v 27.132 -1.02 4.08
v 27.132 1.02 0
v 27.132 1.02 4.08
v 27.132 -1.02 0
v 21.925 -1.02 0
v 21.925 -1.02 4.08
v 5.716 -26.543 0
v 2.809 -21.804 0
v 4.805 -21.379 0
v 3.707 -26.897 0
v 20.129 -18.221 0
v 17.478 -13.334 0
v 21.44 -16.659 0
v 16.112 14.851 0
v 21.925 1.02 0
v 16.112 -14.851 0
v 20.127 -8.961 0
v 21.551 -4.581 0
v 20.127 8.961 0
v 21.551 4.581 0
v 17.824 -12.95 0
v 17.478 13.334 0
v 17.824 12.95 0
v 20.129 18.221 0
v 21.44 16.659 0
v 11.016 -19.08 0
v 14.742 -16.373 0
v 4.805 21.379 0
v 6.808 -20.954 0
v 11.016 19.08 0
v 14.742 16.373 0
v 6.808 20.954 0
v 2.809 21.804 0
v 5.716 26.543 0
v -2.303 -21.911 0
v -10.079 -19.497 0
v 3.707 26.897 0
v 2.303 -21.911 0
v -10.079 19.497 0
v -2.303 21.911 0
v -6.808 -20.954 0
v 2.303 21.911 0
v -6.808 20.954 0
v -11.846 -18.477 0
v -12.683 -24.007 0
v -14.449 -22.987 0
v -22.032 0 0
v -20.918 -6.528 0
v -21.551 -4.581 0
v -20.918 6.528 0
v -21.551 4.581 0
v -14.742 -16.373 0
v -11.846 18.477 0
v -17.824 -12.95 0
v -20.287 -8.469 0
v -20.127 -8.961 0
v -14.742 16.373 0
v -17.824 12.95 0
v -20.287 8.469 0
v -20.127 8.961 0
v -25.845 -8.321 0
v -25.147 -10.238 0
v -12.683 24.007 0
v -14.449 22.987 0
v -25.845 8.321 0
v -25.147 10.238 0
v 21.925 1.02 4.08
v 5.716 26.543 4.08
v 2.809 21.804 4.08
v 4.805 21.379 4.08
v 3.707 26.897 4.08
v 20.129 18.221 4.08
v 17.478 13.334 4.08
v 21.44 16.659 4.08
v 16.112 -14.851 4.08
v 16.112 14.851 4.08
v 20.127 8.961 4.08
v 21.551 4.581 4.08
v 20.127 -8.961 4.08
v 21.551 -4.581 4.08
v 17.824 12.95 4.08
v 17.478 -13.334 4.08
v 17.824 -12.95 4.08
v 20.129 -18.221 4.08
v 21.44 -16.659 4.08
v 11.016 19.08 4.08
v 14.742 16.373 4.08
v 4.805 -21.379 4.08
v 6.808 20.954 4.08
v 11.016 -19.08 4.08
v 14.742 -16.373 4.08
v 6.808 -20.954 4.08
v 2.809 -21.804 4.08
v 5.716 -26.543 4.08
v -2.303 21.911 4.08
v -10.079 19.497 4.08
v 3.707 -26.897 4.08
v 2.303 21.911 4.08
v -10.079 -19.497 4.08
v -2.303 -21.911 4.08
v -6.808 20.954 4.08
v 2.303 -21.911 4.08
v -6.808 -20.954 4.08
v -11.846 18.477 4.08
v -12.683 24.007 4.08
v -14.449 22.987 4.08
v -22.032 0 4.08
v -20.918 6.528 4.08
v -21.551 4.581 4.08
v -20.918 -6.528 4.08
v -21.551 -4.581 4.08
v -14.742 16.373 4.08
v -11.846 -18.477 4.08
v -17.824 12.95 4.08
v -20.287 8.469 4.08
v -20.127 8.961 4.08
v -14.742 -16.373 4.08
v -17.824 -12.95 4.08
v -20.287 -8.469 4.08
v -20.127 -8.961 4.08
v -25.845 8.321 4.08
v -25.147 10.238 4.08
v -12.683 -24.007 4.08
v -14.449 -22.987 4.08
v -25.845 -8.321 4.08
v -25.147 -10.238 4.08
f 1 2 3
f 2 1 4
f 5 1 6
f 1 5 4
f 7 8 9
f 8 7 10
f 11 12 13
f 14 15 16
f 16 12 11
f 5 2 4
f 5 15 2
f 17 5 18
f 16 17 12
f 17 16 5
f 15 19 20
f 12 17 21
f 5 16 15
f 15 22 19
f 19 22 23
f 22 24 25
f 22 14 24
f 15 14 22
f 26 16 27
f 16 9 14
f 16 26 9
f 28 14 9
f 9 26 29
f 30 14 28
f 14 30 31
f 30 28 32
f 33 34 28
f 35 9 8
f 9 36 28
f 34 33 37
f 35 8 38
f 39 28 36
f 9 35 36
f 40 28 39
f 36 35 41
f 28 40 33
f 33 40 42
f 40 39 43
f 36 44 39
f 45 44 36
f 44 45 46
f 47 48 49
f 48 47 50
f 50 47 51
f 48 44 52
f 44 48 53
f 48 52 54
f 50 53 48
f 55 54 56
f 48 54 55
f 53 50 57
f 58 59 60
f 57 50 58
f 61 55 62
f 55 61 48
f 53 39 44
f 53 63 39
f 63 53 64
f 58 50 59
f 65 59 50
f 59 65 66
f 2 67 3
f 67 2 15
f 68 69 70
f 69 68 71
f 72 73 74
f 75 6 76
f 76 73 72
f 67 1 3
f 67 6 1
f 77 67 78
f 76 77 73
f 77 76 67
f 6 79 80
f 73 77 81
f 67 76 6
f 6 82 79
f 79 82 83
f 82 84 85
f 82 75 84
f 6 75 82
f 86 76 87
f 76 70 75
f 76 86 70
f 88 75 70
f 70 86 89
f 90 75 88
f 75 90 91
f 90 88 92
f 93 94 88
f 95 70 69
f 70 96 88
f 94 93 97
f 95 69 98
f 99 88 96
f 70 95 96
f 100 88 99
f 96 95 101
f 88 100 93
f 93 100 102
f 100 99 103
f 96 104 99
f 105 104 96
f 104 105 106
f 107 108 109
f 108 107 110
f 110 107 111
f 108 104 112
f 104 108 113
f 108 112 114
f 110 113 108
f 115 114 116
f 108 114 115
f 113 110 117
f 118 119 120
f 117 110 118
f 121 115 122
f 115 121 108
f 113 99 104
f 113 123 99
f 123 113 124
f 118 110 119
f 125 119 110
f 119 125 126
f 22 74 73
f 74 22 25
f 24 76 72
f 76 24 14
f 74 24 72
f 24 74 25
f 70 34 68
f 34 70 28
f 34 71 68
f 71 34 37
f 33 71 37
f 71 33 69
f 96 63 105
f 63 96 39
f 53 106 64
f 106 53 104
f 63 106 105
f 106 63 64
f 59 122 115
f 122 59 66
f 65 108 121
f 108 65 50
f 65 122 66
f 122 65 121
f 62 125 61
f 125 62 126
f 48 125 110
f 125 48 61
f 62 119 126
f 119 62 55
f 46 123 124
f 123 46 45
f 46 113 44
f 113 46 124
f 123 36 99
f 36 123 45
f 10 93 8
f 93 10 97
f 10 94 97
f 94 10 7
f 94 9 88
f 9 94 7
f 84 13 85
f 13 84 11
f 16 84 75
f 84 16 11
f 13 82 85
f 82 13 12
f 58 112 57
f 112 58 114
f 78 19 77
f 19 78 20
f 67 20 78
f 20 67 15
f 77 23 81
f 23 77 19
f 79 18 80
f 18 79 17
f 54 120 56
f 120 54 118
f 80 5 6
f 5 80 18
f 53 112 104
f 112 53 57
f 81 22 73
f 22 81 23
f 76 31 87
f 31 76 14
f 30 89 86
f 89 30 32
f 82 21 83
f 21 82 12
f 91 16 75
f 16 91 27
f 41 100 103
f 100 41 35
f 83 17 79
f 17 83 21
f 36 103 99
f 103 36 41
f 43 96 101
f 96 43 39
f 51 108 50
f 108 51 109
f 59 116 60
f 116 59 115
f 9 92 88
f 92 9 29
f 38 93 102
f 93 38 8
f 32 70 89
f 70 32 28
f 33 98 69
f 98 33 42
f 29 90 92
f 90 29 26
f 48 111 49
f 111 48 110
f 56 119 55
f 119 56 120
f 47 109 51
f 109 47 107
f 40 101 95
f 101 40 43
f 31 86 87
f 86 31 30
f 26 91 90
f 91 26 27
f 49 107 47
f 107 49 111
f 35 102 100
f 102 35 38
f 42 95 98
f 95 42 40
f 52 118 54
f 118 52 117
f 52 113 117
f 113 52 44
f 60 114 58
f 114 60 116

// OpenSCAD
/***********************************
Puoblic domain GPL licence
by Dirk Hamm 05/07/2020
Montbazin - France
roberto.hamm@sfr.fr
http://robotix.ah-oui.org
************************************
gear(
nb-teeth,
thikness,
scale);
***********************************/

module gr_1(n=0,thk=0){

    r = n*12;  //Radius af cirkel
  
module tooth(){
    sz = 10; //Bredden af tændernes kontakt til cirkel
    sx = 10; //bredden af tændernes ender
    th = thk;
    of = 20;  //Længden af tænderne
 
        
    hull(){
    translate([0,0,th/2])
    cube([sz,sz,th],center=true); 
    translate([of,0,th/2])
    cube([sx,sx,th],center=true);}}

    for(i=[0:n]) //n is number of teeth
    rotate([0,0,i*360/n])
    translate([r,0,0]) 
    tooth();
    
    cylinder(r=r,h=thk);}

module gear(n=0,thk=0,sc=0){
    sc = sc*0.0204;
    scale(sc)
    gr_1(n=n,thk=thk);}


 gear(9,20,10);  //(antal tænder, tandhjulets højde, tandhjulets scalering) 
